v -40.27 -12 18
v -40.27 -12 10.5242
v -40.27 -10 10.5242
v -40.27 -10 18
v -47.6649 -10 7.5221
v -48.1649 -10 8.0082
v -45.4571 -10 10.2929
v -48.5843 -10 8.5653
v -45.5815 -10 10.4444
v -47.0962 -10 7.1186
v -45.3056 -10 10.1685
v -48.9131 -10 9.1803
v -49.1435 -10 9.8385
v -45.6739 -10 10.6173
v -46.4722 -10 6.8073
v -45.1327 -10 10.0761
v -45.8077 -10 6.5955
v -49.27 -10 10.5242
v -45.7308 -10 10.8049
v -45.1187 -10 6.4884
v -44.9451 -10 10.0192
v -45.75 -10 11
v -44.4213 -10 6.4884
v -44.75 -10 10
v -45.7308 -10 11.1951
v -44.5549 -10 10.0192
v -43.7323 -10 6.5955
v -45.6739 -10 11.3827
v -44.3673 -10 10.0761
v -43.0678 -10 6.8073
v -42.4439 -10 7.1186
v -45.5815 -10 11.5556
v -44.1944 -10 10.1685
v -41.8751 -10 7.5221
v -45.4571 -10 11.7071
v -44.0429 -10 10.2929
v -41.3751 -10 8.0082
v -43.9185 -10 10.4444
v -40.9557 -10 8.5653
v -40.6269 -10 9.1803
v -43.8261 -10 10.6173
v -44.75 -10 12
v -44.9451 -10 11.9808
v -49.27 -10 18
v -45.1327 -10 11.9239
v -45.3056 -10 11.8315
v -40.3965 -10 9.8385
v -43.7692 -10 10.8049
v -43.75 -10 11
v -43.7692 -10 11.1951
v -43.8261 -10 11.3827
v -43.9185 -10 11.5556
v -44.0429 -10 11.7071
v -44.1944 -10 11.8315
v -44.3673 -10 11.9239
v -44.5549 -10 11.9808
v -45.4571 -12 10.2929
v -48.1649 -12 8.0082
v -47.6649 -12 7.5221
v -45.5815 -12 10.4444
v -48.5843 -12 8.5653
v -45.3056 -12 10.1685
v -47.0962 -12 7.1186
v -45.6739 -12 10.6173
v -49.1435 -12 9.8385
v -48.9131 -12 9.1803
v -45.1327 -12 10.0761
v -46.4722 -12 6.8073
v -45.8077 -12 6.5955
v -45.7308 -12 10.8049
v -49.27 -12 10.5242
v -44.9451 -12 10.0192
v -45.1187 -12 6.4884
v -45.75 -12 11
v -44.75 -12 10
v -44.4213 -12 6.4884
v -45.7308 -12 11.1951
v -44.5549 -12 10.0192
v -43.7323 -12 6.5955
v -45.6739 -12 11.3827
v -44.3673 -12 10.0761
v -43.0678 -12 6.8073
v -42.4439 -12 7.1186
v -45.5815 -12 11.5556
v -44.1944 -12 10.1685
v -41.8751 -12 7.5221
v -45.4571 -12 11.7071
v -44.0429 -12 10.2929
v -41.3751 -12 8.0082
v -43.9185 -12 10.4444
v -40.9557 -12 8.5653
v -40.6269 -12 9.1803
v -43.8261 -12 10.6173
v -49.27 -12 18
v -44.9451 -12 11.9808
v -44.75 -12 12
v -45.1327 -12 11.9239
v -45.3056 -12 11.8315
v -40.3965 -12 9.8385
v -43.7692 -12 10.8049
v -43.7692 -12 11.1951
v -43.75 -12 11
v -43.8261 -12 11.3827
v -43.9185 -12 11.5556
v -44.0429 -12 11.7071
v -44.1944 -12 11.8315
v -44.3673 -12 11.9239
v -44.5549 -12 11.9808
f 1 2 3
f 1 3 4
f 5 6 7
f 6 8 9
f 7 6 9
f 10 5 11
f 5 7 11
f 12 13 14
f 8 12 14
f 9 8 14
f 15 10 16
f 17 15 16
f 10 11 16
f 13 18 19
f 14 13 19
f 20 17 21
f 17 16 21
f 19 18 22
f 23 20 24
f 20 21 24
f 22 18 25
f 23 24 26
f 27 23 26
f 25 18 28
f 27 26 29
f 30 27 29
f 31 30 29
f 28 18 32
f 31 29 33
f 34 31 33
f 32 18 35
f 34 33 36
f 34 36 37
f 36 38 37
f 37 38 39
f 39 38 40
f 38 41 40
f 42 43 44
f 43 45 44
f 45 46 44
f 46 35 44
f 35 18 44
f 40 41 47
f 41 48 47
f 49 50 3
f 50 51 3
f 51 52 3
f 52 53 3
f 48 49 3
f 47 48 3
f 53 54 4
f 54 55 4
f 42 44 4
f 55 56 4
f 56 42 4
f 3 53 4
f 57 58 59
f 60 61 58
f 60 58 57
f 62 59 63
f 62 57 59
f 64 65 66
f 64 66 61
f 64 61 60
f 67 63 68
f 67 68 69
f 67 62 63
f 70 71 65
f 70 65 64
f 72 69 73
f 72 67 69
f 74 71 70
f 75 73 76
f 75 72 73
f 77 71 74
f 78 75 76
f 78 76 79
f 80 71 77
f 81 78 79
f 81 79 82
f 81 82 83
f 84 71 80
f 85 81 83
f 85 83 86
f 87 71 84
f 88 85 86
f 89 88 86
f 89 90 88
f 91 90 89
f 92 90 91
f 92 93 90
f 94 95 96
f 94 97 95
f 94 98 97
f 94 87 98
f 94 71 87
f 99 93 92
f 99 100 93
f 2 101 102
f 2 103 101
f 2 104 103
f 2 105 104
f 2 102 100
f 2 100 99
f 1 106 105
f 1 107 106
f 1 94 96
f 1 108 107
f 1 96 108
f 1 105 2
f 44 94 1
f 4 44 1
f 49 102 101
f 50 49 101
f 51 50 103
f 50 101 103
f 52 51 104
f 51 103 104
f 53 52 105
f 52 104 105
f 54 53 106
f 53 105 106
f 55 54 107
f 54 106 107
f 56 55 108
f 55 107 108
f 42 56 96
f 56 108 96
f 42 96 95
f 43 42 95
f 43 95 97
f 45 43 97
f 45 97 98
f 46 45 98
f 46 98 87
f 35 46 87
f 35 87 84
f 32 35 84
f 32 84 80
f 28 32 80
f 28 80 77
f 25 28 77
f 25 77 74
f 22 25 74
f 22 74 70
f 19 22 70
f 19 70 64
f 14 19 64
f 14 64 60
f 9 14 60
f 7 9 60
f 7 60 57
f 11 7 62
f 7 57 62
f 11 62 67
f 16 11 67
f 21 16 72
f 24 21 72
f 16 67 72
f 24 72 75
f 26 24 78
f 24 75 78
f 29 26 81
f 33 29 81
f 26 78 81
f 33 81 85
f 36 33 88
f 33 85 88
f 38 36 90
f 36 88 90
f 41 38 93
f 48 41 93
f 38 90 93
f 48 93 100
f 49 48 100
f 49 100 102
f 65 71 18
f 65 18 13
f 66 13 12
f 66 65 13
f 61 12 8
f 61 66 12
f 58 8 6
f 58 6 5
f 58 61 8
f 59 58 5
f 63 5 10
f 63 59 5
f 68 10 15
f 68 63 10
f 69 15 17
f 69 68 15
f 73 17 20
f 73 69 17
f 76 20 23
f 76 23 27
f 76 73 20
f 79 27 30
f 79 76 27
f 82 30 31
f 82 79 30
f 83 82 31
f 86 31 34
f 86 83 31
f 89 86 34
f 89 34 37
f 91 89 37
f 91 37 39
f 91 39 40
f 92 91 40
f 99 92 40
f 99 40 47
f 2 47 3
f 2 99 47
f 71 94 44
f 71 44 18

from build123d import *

# Parameters (mm, degrees)
SKETCH330_AS_DRAWN_R                 = 1
EXTRUDE200_DEPTH                     = 5
EXTRUDE200_ONTO_SKETCH330_ROLL_ANGLE = 90
EXTRUDE201_DEPTH                     = 2
EXTRUDE201_ONTO_SKETCH329_ROLL_ANGLE = 90


with BuildPart() as extrude200:
    # Sketch330 as drawn → Extrude200 (new)
    with BuildSketch(Plane.XY):
        with Locations((-45, 11)):
            Circle(SKETCH330_AS_DRAWN_R)
    extrude(amount=-EXTRUDE200_DEPTH)


with BuildPart() as extrude200_1:
    # Extrude200 onto Sketch330 roll: moved
    add(extrude200.part.rotate(Axis((0, 0, 0), (1, 0, 0)), EXTRUDE200_ONTO_SKETCH330_ROLL_ANGLE))


with BuildPart() as extrude200_2:
    # Extrude200 onto Sketch330 placement: moved
    add(extrude200_1.part.moved(Location((0.25, 0, 0))))


with BuildPart() as extrude200_3:
    # Extrude200 placement: moved
    add(extrude200_2.part.moved(Location((0, 8, 0))))


with BuildPart() as speedrig_right:
    # Sketch329 as drawn → Extrude201 (new)
    with BuildSketch(Plane.XY):
        with BuildLine():
            ThreePointArc((-49, 10.52425), (-44.500001, 6.474921), (-40, 10.524249))
            Line((-40, 10.524249), (-40, 18))
            Line((-49, 18), (-40, 18))
            Line((-49, 18), (-49, 10.52425))
        make_face()
    extrude(amount=-EXTRUDE201_DEPTH)


with BuildPart() as speedrig_right_1:
    # Extrude201 onto Sketch329 roll: moved
    add(speedrig_right.part.rotate(Axis((0, 0, 0), (1, 0, 0)), EXTRUDE201_ONTO_SKETCH329_ROLL_ANGLE))


with BuildPart() as speedrig_right_2:
    # Extrude201 onto Sketch329 placement: moved
    add(speedrig_right_1.part)


with BuildPart() as speedrig_right_3:
    # Extrude201 placement: moved
    add(speedrig_right_2.part.moved(Location((-0.27, 10, 0))))

    # Cut107: cut Extrude200
    add(extrude200_3.part, mode=Mode.SUBTRACT)


with BuildPart() as speedrig_right_4:
    # Cut107 placement: moved
    add(speedrig_right_3.part.moved(Location((0, -22, 0))))


solid = speedrig_right_4.part
